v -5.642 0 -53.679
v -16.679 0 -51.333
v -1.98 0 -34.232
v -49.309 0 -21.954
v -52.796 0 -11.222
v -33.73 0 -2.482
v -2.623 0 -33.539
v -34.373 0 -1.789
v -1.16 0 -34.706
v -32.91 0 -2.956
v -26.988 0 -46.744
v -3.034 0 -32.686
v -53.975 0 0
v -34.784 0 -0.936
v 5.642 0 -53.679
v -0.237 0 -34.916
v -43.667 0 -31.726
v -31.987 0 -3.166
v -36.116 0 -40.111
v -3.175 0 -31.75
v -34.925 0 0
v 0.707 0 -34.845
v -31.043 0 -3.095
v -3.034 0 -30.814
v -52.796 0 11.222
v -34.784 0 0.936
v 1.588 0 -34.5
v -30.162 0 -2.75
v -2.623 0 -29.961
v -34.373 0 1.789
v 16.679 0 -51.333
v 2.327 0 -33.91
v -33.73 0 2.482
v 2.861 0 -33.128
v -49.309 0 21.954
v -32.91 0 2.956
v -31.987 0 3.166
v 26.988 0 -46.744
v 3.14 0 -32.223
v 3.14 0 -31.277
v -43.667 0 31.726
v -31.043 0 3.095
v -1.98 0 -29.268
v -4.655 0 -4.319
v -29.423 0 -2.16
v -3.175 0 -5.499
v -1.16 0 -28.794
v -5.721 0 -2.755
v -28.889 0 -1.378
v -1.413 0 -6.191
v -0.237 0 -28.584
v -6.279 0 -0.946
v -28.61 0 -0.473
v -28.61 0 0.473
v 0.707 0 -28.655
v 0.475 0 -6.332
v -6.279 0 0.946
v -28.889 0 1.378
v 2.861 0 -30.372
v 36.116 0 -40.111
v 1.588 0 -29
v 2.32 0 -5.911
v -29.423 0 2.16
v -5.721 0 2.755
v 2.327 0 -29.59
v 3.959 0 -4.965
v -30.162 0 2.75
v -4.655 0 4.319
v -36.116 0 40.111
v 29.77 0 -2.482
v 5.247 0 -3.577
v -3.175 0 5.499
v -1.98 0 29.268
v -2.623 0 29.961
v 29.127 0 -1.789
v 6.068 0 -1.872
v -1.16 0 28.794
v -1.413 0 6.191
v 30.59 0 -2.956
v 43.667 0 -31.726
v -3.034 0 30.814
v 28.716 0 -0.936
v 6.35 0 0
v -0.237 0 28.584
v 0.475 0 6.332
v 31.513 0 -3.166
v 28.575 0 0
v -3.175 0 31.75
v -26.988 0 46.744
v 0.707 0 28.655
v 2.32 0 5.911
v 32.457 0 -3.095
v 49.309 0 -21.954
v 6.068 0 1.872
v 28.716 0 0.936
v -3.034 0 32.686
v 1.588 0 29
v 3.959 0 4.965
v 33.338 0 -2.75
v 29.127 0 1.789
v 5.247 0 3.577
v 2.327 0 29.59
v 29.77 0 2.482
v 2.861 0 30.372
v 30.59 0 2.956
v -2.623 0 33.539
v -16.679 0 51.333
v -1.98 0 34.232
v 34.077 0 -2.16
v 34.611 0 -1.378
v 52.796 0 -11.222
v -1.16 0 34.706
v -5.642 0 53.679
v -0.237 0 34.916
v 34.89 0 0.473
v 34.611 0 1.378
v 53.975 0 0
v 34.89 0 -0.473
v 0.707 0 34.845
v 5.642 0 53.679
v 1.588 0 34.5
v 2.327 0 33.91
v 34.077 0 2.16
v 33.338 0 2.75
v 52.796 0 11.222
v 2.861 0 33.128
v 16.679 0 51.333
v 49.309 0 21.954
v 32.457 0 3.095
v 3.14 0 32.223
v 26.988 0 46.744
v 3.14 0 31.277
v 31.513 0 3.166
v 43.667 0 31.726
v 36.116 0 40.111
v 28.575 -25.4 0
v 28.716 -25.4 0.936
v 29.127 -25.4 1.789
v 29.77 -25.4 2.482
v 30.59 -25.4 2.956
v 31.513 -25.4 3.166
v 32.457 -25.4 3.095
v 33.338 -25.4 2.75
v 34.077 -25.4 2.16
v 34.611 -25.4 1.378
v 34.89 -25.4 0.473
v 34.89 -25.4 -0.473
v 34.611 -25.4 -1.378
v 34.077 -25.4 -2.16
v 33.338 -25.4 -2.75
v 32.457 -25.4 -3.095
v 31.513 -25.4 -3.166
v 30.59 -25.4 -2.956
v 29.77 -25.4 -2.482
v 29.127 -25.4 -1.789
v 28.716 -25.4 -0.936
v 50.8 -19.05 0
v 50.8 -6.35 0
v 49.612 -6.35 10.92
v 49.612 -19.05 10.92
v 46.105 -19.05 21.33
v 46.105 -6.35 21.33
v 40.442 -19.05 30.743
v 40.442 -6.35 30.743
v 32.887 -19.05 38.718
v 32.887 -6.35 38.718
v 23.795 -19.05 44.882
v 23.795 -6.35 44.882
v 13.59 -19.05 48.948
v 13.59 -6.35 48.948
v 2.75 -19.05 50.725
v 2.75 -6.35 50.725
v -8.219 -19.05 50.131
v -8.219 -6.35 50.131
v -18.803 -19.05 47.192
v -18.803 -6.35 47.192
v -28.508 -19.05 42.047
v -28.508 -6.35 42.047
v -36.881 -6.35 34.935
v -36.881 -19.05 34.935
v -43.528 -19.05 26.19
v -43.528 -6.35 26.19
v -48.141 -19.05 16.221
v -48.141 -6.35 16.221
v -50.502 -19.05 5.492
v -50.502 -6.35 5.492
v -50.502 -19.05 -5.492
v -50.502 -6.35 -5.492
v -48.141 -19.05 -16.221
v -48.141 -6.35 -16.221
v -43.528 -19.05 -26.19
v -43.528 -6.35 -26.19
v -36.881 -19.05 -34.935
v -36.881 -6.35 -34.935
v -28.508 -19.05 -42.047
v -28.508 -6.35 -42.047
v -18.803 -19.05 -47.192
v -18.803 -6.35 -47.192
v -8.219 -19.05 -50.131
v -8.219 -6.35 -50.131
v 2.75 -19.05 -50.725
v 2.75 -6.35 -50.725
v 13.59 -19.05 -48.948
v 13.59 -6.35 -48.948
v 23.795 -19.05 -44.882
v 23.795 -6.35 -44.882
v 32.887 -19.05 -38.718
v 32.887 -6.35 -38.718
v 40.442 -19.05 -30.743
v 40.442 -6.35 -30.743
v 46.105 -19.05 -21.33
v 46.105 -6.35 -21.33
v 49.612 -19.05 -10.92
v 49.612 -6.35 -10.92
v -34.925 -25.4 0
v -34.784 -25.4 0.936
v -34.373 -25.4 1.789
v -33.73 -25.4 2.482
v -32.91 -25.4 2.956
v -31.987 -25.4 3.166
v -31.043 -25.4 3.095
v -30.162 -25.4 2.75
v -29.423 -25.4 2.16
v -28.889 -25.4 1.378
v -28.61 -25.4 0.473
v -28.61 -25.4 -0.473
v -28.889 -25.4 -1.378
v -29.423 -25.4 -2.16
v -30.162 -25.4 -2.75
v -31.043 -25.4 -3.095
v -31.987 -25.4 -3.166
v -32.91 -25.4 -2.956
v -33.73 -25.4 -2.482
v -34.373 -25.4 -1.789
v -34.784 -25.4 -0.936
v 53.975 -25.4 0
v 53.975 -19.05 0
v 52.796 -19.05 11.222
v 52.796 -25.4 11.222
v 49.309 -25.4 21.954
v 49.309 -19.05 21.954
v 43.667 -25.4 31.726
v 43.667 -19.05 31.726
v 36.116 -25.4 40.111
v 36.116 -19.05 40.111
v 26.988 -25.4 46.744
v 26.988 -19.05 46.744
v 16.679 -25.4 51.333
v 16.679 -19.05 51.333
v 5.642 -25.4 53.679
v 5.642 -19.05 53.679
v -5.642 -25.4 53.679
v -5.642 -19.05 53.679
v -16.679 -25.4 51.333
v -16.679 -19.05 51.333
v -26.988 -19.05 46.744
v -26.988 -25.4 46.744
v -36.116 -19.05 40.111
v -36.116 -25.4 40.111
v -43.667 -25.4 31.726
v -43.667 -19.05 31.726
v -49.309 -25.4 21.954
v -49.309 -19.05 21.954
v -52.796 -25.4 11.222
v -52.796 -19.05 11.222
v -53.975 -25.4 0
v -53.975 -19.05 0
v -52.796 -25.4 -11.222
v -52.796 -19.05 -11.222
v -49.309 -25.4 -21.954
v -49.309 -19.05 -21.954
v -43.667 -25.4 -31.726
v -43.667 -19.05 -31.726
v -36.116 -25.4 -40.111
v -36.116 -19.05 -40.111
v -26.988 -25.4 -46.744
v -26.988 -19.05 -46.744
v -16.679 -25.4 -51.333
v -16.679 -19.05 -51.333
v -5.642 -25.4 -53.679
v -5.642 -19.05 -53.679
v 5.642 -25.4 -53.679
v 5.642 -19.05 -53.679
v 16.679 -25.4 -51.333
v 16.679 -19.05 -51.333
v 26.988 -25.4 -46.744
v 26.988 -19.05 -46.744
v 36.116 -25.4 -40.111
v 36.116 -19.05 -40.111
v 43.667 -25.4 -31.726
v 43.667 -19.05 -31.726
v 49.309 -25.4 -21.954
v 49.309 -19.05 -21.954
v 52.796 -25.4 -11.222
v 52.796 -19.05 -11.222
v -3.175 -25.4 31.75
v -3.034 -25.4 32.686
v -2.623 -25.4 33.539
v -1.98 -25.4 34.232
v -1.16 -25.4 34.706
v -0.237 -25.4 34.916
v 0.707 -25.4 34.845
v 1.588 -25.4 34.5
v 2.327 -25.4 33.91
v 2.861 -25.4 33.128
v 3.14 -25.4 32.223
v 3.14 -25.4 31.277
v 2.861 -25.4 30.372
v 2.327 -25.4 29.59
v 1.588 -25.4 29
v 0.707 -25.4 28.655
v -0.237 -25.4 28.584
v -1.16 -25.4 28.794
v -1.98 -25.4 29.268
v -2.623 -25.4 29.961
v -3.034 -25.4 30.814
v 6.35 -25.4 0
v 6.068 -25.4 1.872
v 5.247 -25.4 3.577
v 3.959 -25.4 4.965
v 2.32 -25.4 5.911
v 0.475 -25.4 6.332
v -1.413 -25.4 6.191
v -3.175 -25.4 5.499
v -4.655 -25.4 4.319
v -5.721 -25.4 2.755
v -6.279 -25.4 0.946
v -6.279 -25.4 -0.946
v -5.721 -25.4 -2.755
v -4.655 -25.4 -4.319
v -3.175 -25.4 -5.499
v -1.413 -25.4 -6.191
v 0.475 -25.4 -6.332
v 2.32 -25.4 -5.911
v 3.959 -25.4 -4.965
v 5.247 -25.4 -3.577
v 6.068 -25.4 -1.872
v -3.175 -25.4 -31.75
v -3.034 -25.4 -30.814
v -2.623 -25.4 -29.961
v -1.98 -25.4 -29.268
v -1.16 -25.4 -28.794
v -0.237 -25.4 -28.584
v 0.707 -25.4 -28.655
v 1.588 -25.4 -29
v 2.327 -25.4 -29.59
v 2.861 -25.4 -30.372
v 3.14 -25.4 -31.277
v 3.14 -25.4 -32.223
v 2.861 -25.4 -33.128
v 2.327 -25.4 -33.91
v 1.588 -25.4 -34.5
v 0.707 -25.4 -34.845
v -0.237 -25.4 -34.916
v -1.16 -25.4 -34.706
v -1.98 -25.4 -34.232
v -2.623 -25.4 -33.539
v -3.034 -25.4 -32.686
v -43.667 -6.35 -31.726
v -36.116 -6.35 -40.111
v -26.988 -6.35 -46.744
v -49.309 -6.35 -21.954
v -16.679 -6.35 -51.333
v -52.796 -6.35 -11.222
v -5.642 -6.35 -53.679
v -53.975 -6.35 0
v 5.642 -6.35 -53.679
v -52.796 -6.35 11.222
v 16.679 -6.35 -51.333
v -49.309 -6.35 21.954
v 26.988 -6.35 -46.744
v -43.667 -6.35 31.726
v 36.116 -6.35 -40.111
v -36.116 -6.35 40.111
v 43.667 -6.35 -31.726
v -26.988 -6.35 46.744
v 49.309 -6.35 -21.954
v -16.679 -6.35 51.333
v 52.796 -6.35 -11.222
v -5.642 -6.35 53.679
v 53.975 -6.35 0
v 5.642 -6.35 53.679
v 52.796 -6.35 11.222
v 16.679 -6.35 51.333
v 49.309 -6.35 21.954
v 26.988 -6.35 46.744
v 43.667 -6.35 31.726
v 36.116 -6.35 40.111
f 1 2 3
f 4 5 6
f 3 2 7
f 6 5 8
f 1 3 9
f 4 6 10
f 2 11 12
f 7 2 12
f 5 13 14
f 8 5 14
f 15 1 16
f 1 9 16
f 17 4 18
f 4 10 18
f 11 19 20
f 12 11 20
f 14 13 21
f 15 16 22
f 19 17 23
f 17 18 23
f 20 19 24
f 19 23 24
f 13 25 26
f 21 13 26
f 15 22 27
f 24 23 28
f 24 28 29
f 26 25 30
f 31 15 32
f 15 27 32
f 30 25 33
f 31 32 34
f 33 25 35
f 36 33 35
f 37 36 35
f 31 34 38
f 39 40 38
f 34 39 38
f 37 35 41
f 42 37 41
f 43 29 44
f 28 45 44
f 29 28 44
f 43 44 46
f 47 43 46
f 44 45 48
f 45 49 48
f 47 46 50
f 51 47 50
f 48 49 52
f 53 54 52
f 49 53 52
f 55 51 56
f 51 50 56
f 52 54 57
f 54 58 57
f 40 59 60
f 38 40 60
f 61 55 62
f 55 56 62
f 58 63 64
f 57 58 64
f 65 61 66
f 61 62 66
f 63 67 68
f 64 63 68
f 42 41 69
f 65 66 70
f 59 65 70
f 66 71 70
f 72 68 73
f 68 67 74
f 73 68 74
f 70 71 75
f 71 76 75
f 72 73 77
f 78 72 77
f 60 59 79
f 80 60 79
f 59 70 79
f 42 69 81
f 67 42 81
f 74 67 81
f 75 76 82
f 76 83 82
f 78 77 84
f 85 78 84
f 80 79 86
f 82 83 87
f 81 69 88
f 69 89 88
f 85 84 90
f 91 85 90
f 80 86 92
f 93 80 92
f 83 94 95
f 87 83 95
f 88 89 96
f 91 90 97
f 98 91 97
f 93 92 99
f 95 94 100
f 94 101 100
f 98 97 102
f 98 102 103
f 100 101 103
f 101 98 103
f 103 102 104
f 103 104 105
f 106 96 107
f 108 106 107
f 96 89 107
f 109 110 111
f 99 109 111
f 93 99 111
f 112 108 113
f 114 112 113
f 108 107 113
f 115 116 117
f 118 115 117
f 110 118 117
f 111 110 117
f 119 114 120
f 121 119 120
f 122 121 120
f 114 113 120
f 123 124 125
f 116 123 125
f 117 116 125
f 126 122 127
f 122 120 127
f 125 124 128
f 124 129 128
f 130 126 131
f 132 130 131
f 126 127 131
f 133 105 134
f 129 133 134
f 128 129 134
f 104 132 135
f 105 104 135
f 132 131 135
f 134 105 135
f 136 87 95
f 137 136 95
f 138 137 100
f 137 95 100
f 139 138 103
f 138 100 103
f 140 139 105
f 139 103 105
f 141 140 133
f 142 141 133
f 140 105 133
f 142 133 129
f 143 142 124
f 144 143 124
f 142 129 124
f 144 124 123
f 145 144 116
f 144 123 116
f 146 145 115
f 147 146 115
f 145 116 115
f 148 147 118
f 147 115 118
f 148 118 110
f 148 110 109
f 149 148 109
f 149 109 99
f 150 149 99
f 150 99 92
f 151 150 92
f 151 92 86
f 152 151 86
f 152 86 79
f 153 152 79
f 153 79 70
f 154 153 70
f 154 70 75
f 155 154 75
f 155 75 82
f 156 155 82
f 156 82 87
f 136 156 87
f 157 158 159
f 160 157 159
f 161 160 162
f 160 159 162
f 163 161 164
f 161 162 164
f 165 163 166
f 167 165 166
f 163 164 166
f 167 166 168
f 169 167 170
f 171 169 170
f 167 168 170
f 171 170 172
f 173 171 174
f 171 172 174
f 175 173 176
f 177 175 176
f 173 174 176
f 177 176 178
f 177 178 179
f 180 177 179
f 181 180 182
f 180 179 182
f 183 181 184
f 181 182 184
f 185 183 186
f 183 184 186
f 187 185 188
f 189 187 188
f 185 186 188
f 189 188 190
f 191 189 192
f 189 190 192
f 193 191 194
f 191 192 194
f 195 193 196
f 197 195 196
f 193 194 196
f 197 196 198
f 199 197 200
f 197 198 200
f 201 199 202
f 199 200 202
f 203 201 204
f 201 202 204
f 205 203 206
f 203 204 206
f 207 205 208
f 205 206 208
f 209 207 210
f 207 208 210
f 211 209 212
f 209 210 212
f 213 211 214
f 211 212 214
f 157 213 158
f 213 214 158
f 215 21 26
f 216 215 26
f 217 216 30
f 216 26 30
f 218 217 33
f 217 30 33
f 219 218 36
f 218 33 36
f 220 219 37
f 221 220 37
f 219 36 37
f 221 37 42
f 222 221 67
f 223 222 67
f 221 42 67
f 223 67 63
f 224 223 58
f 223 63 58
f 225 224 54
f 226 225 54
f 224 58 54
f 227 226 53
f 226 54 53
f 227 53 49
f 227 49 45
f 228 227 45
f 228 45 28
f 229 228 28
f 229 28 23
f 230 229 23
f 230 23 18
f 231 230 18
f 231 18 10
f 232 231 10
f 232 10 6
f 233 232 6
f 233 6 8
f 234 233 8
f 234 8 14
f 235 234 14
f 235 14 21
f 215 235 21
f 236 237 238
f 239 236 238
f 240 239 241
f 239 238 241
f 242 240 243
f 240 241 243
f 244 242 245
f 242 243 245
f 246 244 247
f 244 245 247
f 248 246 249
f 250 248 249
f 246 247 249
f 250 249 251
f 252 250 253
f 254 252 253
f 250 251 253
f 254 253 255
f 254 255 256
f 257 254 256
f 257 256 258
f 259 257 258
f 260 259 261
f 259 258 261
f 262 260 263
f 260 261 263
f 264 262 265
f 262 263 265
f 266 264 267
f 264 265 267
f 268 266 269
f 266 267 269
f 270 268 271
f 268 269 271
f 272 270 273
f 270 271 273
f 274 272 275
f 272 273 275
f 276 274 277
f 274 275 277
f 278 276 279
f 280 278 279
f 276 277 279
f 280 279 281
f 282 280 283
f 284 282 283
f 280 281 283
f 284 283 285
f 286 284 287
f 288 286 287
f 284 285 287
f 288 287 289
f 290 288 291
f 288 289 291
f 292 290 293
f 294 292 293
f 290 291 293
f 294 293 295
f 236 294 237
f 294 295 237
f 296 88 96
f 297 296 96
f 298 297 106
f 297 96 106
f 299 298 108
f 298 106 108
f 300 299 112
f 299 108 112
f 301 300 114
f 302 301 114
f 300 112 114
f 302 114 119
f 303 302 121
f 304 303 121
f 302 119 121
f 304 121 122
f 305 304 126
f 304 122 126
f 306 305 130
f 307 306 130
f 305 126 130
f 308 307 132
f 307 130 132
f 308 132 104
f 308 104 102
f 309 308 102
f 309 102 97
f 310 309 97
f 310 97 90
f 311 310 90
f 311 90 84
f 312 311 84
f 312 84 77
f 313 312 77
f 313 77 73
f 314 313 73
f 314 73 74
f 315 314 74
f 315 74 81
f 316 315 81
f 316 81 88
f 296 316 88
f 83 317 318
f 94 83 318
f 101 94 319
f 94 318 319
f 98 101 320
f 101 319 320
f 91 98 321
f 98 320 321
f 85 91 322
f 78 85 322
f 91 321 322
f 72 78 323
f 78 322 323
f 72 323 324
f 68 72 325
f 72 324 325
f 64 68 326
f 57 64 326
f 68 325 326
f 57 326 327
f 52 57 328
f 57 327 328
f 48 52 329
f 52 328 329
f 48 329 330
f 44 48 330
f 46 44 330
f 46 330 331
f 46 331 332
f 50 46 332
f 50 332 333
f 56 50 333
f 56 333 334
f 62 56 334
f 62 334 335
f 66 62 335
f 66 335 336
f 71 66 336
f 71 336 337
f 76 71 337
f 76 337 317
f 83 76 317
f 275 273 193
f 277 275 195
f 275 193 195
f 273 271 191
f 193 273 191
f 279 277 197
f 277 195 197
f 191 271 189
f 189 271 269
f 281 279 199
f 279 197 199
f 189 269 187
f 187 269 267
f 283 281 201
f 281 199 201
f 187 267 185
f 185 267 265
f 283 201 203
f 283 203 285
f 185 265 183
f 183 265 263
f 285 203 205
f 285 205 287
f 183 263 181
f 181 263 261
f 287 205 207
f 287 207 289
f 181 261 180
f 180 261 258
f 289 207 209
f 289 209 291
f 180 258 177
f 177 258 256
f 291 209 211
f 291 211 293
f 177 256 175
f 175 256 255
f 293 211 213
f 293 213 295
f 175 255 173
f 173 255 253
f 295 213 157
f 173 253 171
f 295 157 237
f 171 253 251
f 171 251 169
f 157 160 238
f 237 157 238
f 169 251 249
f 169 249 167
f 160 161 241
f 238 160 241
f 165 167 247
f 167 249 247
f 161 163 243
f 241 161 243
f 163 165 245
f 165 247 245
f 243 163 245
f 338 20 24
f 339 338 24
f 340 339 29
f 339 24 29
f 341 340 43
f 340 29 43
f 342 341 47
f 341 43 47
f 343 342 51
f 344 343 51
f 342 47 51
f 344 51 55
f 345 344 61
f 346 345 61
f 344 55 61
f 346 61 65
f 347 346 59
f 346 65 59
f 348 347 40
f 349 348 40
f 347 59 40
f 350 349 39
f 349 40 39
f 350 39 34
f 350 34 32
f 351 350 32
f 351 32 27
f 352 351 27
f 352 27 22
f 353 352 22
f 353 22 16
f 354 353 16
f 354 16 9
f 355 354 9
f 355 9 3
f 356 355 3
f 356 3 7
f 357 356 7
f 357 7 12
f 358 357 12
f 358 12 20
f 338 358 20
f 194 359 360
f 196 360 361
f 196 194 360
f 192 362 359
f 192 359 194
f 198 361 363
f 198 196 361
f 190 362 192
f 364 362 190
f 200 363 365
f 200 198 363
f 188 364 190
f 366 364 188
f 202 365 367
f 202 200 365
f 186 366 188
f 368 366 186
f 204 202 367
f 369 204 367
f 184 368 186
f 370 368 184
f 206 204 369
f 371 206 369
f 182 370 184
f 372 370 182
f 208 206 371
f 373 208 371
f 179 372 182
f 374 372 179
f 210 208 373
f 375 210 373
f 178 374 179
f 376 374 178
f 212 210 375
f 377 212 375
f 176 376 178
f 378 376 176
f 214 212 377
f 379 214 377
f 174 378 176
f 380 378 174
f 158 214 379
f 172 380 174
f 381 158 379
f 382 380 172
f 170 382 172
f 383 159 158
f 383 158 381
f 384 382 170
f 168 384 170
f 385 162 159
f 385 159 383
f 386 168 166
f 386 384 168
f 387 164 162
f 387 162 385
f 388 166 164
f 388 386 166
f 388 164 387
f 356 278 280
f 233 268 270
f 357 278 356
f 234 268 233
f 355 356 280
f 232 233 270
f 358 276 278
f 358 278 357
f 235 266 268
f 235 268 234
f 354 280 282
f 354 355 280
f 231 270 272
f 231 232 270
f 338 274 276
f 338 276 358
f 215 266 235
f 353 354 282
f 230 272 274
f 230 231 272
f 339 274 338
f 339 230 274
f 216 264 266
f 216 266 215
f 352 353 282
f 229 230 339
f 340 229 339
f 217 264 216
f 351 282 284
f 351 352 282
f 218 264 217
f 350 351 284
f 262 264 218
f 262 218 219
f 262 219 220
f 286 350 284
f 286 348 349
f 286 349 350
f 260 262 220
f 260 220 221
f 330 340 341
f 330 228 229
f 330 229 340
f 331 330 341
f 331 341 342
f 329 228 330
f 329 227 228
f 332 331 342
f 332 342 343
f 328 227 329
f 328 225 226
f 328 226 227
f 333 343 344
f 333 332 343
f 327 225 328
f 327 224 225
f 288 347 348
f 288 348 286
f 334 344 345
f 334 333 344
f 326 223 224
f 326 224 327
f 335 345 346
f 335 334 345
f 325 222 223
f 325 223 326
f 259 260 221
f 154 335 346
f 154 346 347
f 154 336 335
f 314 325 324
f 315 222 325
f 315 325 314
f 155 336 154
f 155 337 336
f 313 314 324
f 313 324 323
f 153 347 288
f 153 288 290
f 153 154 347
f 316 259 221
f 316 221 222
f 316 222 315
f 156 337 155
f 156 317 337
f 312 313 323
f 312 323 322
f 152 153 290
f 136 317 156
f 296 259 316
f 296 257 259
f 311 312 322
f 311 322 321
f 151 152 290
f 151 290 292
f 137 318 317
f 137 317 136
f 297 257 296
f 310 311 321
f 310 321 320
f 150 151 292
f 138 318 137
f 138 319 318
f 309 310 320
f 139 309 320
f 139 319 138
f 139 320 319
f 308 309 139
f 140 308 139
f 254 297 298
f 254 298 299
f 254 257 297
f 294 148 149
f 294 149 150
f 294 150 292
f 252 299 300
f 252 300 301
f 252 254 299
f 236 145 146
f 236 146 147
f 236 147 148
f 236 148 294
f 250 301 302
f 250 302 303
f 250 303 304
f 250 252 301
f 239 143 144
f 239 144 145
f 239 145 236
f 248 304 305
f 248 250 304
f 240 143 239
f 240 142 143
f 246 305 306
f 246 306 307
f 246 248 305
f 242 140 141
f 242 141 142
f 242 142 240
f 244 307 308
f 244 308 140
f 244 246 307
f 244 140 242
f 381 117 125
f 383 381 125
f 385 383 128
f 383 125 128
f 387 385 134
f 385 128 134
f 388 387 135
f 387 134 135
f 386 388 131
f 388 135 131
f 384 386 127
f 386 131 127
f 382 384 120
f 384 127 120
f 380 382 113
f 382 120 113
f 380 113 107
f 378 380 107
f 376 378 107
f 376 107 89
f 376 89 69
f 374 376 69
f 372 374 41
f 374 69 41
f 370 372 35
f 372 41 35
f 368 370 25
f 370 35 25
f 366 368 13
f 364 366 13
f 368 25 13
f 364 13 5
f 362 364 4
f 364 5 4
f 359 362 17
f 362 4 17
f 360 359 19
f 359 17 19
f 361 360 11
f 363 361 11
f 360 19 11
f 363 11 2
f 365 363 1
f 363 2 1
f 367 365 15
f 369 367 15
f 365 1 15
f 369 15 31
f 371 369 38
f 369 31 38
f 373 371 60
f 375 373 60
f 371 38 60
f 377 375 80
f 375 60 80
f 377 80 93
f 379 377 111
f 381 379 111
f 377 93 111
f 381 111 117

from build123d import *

# Parameters (mm, degrees)
F0_R     = 53.975
F1_DEPTH = 6.35
F2_R     = 50.8
F3_DEPTH = 12.7
F4_R     = 53.975
F5_DEPTH = 6.35
F7_D     = 6.35
F8_R     = 6.35
F9_DEPTH = 25.401


with BuildPart() as f1:
    # F0 (on Front) → F1 (new body)
    with BuildSketch(Plane.XZ):
        Circle(F0_R)
    extrude(amount=F1_DEPTH)

    # F2 (on face) → F3 (join)
    with BuildSketch(Plane.XZ.offset(6.35)):
        Circle(F2_R)
    extrude(amount=F3_DEPTH)

    # F4 (on face) → F5 (join)
    with BuildSketch(Plane.XZ.offset(19.05)):
        Circle(F4_R)
    extrude(amount=F5_DEPTH)

    # F7 (through all)
    with Locations(Plane.XZ.offset(25.4)):
        with Locations((0, 31.75), (31.75, 0), (0, -31.75), (-31.75, 0)):
            Hole(F7_D / 2)

    # F8 (on face) → F9 (cut, through all)
    with BuildSketch(Plane.XZ.offset(25.4)):
        Circle(F8_R)
    extrude(amount=-F9_DEPTH, mode=Mode.SUBTRACT)


solid = f1.part
